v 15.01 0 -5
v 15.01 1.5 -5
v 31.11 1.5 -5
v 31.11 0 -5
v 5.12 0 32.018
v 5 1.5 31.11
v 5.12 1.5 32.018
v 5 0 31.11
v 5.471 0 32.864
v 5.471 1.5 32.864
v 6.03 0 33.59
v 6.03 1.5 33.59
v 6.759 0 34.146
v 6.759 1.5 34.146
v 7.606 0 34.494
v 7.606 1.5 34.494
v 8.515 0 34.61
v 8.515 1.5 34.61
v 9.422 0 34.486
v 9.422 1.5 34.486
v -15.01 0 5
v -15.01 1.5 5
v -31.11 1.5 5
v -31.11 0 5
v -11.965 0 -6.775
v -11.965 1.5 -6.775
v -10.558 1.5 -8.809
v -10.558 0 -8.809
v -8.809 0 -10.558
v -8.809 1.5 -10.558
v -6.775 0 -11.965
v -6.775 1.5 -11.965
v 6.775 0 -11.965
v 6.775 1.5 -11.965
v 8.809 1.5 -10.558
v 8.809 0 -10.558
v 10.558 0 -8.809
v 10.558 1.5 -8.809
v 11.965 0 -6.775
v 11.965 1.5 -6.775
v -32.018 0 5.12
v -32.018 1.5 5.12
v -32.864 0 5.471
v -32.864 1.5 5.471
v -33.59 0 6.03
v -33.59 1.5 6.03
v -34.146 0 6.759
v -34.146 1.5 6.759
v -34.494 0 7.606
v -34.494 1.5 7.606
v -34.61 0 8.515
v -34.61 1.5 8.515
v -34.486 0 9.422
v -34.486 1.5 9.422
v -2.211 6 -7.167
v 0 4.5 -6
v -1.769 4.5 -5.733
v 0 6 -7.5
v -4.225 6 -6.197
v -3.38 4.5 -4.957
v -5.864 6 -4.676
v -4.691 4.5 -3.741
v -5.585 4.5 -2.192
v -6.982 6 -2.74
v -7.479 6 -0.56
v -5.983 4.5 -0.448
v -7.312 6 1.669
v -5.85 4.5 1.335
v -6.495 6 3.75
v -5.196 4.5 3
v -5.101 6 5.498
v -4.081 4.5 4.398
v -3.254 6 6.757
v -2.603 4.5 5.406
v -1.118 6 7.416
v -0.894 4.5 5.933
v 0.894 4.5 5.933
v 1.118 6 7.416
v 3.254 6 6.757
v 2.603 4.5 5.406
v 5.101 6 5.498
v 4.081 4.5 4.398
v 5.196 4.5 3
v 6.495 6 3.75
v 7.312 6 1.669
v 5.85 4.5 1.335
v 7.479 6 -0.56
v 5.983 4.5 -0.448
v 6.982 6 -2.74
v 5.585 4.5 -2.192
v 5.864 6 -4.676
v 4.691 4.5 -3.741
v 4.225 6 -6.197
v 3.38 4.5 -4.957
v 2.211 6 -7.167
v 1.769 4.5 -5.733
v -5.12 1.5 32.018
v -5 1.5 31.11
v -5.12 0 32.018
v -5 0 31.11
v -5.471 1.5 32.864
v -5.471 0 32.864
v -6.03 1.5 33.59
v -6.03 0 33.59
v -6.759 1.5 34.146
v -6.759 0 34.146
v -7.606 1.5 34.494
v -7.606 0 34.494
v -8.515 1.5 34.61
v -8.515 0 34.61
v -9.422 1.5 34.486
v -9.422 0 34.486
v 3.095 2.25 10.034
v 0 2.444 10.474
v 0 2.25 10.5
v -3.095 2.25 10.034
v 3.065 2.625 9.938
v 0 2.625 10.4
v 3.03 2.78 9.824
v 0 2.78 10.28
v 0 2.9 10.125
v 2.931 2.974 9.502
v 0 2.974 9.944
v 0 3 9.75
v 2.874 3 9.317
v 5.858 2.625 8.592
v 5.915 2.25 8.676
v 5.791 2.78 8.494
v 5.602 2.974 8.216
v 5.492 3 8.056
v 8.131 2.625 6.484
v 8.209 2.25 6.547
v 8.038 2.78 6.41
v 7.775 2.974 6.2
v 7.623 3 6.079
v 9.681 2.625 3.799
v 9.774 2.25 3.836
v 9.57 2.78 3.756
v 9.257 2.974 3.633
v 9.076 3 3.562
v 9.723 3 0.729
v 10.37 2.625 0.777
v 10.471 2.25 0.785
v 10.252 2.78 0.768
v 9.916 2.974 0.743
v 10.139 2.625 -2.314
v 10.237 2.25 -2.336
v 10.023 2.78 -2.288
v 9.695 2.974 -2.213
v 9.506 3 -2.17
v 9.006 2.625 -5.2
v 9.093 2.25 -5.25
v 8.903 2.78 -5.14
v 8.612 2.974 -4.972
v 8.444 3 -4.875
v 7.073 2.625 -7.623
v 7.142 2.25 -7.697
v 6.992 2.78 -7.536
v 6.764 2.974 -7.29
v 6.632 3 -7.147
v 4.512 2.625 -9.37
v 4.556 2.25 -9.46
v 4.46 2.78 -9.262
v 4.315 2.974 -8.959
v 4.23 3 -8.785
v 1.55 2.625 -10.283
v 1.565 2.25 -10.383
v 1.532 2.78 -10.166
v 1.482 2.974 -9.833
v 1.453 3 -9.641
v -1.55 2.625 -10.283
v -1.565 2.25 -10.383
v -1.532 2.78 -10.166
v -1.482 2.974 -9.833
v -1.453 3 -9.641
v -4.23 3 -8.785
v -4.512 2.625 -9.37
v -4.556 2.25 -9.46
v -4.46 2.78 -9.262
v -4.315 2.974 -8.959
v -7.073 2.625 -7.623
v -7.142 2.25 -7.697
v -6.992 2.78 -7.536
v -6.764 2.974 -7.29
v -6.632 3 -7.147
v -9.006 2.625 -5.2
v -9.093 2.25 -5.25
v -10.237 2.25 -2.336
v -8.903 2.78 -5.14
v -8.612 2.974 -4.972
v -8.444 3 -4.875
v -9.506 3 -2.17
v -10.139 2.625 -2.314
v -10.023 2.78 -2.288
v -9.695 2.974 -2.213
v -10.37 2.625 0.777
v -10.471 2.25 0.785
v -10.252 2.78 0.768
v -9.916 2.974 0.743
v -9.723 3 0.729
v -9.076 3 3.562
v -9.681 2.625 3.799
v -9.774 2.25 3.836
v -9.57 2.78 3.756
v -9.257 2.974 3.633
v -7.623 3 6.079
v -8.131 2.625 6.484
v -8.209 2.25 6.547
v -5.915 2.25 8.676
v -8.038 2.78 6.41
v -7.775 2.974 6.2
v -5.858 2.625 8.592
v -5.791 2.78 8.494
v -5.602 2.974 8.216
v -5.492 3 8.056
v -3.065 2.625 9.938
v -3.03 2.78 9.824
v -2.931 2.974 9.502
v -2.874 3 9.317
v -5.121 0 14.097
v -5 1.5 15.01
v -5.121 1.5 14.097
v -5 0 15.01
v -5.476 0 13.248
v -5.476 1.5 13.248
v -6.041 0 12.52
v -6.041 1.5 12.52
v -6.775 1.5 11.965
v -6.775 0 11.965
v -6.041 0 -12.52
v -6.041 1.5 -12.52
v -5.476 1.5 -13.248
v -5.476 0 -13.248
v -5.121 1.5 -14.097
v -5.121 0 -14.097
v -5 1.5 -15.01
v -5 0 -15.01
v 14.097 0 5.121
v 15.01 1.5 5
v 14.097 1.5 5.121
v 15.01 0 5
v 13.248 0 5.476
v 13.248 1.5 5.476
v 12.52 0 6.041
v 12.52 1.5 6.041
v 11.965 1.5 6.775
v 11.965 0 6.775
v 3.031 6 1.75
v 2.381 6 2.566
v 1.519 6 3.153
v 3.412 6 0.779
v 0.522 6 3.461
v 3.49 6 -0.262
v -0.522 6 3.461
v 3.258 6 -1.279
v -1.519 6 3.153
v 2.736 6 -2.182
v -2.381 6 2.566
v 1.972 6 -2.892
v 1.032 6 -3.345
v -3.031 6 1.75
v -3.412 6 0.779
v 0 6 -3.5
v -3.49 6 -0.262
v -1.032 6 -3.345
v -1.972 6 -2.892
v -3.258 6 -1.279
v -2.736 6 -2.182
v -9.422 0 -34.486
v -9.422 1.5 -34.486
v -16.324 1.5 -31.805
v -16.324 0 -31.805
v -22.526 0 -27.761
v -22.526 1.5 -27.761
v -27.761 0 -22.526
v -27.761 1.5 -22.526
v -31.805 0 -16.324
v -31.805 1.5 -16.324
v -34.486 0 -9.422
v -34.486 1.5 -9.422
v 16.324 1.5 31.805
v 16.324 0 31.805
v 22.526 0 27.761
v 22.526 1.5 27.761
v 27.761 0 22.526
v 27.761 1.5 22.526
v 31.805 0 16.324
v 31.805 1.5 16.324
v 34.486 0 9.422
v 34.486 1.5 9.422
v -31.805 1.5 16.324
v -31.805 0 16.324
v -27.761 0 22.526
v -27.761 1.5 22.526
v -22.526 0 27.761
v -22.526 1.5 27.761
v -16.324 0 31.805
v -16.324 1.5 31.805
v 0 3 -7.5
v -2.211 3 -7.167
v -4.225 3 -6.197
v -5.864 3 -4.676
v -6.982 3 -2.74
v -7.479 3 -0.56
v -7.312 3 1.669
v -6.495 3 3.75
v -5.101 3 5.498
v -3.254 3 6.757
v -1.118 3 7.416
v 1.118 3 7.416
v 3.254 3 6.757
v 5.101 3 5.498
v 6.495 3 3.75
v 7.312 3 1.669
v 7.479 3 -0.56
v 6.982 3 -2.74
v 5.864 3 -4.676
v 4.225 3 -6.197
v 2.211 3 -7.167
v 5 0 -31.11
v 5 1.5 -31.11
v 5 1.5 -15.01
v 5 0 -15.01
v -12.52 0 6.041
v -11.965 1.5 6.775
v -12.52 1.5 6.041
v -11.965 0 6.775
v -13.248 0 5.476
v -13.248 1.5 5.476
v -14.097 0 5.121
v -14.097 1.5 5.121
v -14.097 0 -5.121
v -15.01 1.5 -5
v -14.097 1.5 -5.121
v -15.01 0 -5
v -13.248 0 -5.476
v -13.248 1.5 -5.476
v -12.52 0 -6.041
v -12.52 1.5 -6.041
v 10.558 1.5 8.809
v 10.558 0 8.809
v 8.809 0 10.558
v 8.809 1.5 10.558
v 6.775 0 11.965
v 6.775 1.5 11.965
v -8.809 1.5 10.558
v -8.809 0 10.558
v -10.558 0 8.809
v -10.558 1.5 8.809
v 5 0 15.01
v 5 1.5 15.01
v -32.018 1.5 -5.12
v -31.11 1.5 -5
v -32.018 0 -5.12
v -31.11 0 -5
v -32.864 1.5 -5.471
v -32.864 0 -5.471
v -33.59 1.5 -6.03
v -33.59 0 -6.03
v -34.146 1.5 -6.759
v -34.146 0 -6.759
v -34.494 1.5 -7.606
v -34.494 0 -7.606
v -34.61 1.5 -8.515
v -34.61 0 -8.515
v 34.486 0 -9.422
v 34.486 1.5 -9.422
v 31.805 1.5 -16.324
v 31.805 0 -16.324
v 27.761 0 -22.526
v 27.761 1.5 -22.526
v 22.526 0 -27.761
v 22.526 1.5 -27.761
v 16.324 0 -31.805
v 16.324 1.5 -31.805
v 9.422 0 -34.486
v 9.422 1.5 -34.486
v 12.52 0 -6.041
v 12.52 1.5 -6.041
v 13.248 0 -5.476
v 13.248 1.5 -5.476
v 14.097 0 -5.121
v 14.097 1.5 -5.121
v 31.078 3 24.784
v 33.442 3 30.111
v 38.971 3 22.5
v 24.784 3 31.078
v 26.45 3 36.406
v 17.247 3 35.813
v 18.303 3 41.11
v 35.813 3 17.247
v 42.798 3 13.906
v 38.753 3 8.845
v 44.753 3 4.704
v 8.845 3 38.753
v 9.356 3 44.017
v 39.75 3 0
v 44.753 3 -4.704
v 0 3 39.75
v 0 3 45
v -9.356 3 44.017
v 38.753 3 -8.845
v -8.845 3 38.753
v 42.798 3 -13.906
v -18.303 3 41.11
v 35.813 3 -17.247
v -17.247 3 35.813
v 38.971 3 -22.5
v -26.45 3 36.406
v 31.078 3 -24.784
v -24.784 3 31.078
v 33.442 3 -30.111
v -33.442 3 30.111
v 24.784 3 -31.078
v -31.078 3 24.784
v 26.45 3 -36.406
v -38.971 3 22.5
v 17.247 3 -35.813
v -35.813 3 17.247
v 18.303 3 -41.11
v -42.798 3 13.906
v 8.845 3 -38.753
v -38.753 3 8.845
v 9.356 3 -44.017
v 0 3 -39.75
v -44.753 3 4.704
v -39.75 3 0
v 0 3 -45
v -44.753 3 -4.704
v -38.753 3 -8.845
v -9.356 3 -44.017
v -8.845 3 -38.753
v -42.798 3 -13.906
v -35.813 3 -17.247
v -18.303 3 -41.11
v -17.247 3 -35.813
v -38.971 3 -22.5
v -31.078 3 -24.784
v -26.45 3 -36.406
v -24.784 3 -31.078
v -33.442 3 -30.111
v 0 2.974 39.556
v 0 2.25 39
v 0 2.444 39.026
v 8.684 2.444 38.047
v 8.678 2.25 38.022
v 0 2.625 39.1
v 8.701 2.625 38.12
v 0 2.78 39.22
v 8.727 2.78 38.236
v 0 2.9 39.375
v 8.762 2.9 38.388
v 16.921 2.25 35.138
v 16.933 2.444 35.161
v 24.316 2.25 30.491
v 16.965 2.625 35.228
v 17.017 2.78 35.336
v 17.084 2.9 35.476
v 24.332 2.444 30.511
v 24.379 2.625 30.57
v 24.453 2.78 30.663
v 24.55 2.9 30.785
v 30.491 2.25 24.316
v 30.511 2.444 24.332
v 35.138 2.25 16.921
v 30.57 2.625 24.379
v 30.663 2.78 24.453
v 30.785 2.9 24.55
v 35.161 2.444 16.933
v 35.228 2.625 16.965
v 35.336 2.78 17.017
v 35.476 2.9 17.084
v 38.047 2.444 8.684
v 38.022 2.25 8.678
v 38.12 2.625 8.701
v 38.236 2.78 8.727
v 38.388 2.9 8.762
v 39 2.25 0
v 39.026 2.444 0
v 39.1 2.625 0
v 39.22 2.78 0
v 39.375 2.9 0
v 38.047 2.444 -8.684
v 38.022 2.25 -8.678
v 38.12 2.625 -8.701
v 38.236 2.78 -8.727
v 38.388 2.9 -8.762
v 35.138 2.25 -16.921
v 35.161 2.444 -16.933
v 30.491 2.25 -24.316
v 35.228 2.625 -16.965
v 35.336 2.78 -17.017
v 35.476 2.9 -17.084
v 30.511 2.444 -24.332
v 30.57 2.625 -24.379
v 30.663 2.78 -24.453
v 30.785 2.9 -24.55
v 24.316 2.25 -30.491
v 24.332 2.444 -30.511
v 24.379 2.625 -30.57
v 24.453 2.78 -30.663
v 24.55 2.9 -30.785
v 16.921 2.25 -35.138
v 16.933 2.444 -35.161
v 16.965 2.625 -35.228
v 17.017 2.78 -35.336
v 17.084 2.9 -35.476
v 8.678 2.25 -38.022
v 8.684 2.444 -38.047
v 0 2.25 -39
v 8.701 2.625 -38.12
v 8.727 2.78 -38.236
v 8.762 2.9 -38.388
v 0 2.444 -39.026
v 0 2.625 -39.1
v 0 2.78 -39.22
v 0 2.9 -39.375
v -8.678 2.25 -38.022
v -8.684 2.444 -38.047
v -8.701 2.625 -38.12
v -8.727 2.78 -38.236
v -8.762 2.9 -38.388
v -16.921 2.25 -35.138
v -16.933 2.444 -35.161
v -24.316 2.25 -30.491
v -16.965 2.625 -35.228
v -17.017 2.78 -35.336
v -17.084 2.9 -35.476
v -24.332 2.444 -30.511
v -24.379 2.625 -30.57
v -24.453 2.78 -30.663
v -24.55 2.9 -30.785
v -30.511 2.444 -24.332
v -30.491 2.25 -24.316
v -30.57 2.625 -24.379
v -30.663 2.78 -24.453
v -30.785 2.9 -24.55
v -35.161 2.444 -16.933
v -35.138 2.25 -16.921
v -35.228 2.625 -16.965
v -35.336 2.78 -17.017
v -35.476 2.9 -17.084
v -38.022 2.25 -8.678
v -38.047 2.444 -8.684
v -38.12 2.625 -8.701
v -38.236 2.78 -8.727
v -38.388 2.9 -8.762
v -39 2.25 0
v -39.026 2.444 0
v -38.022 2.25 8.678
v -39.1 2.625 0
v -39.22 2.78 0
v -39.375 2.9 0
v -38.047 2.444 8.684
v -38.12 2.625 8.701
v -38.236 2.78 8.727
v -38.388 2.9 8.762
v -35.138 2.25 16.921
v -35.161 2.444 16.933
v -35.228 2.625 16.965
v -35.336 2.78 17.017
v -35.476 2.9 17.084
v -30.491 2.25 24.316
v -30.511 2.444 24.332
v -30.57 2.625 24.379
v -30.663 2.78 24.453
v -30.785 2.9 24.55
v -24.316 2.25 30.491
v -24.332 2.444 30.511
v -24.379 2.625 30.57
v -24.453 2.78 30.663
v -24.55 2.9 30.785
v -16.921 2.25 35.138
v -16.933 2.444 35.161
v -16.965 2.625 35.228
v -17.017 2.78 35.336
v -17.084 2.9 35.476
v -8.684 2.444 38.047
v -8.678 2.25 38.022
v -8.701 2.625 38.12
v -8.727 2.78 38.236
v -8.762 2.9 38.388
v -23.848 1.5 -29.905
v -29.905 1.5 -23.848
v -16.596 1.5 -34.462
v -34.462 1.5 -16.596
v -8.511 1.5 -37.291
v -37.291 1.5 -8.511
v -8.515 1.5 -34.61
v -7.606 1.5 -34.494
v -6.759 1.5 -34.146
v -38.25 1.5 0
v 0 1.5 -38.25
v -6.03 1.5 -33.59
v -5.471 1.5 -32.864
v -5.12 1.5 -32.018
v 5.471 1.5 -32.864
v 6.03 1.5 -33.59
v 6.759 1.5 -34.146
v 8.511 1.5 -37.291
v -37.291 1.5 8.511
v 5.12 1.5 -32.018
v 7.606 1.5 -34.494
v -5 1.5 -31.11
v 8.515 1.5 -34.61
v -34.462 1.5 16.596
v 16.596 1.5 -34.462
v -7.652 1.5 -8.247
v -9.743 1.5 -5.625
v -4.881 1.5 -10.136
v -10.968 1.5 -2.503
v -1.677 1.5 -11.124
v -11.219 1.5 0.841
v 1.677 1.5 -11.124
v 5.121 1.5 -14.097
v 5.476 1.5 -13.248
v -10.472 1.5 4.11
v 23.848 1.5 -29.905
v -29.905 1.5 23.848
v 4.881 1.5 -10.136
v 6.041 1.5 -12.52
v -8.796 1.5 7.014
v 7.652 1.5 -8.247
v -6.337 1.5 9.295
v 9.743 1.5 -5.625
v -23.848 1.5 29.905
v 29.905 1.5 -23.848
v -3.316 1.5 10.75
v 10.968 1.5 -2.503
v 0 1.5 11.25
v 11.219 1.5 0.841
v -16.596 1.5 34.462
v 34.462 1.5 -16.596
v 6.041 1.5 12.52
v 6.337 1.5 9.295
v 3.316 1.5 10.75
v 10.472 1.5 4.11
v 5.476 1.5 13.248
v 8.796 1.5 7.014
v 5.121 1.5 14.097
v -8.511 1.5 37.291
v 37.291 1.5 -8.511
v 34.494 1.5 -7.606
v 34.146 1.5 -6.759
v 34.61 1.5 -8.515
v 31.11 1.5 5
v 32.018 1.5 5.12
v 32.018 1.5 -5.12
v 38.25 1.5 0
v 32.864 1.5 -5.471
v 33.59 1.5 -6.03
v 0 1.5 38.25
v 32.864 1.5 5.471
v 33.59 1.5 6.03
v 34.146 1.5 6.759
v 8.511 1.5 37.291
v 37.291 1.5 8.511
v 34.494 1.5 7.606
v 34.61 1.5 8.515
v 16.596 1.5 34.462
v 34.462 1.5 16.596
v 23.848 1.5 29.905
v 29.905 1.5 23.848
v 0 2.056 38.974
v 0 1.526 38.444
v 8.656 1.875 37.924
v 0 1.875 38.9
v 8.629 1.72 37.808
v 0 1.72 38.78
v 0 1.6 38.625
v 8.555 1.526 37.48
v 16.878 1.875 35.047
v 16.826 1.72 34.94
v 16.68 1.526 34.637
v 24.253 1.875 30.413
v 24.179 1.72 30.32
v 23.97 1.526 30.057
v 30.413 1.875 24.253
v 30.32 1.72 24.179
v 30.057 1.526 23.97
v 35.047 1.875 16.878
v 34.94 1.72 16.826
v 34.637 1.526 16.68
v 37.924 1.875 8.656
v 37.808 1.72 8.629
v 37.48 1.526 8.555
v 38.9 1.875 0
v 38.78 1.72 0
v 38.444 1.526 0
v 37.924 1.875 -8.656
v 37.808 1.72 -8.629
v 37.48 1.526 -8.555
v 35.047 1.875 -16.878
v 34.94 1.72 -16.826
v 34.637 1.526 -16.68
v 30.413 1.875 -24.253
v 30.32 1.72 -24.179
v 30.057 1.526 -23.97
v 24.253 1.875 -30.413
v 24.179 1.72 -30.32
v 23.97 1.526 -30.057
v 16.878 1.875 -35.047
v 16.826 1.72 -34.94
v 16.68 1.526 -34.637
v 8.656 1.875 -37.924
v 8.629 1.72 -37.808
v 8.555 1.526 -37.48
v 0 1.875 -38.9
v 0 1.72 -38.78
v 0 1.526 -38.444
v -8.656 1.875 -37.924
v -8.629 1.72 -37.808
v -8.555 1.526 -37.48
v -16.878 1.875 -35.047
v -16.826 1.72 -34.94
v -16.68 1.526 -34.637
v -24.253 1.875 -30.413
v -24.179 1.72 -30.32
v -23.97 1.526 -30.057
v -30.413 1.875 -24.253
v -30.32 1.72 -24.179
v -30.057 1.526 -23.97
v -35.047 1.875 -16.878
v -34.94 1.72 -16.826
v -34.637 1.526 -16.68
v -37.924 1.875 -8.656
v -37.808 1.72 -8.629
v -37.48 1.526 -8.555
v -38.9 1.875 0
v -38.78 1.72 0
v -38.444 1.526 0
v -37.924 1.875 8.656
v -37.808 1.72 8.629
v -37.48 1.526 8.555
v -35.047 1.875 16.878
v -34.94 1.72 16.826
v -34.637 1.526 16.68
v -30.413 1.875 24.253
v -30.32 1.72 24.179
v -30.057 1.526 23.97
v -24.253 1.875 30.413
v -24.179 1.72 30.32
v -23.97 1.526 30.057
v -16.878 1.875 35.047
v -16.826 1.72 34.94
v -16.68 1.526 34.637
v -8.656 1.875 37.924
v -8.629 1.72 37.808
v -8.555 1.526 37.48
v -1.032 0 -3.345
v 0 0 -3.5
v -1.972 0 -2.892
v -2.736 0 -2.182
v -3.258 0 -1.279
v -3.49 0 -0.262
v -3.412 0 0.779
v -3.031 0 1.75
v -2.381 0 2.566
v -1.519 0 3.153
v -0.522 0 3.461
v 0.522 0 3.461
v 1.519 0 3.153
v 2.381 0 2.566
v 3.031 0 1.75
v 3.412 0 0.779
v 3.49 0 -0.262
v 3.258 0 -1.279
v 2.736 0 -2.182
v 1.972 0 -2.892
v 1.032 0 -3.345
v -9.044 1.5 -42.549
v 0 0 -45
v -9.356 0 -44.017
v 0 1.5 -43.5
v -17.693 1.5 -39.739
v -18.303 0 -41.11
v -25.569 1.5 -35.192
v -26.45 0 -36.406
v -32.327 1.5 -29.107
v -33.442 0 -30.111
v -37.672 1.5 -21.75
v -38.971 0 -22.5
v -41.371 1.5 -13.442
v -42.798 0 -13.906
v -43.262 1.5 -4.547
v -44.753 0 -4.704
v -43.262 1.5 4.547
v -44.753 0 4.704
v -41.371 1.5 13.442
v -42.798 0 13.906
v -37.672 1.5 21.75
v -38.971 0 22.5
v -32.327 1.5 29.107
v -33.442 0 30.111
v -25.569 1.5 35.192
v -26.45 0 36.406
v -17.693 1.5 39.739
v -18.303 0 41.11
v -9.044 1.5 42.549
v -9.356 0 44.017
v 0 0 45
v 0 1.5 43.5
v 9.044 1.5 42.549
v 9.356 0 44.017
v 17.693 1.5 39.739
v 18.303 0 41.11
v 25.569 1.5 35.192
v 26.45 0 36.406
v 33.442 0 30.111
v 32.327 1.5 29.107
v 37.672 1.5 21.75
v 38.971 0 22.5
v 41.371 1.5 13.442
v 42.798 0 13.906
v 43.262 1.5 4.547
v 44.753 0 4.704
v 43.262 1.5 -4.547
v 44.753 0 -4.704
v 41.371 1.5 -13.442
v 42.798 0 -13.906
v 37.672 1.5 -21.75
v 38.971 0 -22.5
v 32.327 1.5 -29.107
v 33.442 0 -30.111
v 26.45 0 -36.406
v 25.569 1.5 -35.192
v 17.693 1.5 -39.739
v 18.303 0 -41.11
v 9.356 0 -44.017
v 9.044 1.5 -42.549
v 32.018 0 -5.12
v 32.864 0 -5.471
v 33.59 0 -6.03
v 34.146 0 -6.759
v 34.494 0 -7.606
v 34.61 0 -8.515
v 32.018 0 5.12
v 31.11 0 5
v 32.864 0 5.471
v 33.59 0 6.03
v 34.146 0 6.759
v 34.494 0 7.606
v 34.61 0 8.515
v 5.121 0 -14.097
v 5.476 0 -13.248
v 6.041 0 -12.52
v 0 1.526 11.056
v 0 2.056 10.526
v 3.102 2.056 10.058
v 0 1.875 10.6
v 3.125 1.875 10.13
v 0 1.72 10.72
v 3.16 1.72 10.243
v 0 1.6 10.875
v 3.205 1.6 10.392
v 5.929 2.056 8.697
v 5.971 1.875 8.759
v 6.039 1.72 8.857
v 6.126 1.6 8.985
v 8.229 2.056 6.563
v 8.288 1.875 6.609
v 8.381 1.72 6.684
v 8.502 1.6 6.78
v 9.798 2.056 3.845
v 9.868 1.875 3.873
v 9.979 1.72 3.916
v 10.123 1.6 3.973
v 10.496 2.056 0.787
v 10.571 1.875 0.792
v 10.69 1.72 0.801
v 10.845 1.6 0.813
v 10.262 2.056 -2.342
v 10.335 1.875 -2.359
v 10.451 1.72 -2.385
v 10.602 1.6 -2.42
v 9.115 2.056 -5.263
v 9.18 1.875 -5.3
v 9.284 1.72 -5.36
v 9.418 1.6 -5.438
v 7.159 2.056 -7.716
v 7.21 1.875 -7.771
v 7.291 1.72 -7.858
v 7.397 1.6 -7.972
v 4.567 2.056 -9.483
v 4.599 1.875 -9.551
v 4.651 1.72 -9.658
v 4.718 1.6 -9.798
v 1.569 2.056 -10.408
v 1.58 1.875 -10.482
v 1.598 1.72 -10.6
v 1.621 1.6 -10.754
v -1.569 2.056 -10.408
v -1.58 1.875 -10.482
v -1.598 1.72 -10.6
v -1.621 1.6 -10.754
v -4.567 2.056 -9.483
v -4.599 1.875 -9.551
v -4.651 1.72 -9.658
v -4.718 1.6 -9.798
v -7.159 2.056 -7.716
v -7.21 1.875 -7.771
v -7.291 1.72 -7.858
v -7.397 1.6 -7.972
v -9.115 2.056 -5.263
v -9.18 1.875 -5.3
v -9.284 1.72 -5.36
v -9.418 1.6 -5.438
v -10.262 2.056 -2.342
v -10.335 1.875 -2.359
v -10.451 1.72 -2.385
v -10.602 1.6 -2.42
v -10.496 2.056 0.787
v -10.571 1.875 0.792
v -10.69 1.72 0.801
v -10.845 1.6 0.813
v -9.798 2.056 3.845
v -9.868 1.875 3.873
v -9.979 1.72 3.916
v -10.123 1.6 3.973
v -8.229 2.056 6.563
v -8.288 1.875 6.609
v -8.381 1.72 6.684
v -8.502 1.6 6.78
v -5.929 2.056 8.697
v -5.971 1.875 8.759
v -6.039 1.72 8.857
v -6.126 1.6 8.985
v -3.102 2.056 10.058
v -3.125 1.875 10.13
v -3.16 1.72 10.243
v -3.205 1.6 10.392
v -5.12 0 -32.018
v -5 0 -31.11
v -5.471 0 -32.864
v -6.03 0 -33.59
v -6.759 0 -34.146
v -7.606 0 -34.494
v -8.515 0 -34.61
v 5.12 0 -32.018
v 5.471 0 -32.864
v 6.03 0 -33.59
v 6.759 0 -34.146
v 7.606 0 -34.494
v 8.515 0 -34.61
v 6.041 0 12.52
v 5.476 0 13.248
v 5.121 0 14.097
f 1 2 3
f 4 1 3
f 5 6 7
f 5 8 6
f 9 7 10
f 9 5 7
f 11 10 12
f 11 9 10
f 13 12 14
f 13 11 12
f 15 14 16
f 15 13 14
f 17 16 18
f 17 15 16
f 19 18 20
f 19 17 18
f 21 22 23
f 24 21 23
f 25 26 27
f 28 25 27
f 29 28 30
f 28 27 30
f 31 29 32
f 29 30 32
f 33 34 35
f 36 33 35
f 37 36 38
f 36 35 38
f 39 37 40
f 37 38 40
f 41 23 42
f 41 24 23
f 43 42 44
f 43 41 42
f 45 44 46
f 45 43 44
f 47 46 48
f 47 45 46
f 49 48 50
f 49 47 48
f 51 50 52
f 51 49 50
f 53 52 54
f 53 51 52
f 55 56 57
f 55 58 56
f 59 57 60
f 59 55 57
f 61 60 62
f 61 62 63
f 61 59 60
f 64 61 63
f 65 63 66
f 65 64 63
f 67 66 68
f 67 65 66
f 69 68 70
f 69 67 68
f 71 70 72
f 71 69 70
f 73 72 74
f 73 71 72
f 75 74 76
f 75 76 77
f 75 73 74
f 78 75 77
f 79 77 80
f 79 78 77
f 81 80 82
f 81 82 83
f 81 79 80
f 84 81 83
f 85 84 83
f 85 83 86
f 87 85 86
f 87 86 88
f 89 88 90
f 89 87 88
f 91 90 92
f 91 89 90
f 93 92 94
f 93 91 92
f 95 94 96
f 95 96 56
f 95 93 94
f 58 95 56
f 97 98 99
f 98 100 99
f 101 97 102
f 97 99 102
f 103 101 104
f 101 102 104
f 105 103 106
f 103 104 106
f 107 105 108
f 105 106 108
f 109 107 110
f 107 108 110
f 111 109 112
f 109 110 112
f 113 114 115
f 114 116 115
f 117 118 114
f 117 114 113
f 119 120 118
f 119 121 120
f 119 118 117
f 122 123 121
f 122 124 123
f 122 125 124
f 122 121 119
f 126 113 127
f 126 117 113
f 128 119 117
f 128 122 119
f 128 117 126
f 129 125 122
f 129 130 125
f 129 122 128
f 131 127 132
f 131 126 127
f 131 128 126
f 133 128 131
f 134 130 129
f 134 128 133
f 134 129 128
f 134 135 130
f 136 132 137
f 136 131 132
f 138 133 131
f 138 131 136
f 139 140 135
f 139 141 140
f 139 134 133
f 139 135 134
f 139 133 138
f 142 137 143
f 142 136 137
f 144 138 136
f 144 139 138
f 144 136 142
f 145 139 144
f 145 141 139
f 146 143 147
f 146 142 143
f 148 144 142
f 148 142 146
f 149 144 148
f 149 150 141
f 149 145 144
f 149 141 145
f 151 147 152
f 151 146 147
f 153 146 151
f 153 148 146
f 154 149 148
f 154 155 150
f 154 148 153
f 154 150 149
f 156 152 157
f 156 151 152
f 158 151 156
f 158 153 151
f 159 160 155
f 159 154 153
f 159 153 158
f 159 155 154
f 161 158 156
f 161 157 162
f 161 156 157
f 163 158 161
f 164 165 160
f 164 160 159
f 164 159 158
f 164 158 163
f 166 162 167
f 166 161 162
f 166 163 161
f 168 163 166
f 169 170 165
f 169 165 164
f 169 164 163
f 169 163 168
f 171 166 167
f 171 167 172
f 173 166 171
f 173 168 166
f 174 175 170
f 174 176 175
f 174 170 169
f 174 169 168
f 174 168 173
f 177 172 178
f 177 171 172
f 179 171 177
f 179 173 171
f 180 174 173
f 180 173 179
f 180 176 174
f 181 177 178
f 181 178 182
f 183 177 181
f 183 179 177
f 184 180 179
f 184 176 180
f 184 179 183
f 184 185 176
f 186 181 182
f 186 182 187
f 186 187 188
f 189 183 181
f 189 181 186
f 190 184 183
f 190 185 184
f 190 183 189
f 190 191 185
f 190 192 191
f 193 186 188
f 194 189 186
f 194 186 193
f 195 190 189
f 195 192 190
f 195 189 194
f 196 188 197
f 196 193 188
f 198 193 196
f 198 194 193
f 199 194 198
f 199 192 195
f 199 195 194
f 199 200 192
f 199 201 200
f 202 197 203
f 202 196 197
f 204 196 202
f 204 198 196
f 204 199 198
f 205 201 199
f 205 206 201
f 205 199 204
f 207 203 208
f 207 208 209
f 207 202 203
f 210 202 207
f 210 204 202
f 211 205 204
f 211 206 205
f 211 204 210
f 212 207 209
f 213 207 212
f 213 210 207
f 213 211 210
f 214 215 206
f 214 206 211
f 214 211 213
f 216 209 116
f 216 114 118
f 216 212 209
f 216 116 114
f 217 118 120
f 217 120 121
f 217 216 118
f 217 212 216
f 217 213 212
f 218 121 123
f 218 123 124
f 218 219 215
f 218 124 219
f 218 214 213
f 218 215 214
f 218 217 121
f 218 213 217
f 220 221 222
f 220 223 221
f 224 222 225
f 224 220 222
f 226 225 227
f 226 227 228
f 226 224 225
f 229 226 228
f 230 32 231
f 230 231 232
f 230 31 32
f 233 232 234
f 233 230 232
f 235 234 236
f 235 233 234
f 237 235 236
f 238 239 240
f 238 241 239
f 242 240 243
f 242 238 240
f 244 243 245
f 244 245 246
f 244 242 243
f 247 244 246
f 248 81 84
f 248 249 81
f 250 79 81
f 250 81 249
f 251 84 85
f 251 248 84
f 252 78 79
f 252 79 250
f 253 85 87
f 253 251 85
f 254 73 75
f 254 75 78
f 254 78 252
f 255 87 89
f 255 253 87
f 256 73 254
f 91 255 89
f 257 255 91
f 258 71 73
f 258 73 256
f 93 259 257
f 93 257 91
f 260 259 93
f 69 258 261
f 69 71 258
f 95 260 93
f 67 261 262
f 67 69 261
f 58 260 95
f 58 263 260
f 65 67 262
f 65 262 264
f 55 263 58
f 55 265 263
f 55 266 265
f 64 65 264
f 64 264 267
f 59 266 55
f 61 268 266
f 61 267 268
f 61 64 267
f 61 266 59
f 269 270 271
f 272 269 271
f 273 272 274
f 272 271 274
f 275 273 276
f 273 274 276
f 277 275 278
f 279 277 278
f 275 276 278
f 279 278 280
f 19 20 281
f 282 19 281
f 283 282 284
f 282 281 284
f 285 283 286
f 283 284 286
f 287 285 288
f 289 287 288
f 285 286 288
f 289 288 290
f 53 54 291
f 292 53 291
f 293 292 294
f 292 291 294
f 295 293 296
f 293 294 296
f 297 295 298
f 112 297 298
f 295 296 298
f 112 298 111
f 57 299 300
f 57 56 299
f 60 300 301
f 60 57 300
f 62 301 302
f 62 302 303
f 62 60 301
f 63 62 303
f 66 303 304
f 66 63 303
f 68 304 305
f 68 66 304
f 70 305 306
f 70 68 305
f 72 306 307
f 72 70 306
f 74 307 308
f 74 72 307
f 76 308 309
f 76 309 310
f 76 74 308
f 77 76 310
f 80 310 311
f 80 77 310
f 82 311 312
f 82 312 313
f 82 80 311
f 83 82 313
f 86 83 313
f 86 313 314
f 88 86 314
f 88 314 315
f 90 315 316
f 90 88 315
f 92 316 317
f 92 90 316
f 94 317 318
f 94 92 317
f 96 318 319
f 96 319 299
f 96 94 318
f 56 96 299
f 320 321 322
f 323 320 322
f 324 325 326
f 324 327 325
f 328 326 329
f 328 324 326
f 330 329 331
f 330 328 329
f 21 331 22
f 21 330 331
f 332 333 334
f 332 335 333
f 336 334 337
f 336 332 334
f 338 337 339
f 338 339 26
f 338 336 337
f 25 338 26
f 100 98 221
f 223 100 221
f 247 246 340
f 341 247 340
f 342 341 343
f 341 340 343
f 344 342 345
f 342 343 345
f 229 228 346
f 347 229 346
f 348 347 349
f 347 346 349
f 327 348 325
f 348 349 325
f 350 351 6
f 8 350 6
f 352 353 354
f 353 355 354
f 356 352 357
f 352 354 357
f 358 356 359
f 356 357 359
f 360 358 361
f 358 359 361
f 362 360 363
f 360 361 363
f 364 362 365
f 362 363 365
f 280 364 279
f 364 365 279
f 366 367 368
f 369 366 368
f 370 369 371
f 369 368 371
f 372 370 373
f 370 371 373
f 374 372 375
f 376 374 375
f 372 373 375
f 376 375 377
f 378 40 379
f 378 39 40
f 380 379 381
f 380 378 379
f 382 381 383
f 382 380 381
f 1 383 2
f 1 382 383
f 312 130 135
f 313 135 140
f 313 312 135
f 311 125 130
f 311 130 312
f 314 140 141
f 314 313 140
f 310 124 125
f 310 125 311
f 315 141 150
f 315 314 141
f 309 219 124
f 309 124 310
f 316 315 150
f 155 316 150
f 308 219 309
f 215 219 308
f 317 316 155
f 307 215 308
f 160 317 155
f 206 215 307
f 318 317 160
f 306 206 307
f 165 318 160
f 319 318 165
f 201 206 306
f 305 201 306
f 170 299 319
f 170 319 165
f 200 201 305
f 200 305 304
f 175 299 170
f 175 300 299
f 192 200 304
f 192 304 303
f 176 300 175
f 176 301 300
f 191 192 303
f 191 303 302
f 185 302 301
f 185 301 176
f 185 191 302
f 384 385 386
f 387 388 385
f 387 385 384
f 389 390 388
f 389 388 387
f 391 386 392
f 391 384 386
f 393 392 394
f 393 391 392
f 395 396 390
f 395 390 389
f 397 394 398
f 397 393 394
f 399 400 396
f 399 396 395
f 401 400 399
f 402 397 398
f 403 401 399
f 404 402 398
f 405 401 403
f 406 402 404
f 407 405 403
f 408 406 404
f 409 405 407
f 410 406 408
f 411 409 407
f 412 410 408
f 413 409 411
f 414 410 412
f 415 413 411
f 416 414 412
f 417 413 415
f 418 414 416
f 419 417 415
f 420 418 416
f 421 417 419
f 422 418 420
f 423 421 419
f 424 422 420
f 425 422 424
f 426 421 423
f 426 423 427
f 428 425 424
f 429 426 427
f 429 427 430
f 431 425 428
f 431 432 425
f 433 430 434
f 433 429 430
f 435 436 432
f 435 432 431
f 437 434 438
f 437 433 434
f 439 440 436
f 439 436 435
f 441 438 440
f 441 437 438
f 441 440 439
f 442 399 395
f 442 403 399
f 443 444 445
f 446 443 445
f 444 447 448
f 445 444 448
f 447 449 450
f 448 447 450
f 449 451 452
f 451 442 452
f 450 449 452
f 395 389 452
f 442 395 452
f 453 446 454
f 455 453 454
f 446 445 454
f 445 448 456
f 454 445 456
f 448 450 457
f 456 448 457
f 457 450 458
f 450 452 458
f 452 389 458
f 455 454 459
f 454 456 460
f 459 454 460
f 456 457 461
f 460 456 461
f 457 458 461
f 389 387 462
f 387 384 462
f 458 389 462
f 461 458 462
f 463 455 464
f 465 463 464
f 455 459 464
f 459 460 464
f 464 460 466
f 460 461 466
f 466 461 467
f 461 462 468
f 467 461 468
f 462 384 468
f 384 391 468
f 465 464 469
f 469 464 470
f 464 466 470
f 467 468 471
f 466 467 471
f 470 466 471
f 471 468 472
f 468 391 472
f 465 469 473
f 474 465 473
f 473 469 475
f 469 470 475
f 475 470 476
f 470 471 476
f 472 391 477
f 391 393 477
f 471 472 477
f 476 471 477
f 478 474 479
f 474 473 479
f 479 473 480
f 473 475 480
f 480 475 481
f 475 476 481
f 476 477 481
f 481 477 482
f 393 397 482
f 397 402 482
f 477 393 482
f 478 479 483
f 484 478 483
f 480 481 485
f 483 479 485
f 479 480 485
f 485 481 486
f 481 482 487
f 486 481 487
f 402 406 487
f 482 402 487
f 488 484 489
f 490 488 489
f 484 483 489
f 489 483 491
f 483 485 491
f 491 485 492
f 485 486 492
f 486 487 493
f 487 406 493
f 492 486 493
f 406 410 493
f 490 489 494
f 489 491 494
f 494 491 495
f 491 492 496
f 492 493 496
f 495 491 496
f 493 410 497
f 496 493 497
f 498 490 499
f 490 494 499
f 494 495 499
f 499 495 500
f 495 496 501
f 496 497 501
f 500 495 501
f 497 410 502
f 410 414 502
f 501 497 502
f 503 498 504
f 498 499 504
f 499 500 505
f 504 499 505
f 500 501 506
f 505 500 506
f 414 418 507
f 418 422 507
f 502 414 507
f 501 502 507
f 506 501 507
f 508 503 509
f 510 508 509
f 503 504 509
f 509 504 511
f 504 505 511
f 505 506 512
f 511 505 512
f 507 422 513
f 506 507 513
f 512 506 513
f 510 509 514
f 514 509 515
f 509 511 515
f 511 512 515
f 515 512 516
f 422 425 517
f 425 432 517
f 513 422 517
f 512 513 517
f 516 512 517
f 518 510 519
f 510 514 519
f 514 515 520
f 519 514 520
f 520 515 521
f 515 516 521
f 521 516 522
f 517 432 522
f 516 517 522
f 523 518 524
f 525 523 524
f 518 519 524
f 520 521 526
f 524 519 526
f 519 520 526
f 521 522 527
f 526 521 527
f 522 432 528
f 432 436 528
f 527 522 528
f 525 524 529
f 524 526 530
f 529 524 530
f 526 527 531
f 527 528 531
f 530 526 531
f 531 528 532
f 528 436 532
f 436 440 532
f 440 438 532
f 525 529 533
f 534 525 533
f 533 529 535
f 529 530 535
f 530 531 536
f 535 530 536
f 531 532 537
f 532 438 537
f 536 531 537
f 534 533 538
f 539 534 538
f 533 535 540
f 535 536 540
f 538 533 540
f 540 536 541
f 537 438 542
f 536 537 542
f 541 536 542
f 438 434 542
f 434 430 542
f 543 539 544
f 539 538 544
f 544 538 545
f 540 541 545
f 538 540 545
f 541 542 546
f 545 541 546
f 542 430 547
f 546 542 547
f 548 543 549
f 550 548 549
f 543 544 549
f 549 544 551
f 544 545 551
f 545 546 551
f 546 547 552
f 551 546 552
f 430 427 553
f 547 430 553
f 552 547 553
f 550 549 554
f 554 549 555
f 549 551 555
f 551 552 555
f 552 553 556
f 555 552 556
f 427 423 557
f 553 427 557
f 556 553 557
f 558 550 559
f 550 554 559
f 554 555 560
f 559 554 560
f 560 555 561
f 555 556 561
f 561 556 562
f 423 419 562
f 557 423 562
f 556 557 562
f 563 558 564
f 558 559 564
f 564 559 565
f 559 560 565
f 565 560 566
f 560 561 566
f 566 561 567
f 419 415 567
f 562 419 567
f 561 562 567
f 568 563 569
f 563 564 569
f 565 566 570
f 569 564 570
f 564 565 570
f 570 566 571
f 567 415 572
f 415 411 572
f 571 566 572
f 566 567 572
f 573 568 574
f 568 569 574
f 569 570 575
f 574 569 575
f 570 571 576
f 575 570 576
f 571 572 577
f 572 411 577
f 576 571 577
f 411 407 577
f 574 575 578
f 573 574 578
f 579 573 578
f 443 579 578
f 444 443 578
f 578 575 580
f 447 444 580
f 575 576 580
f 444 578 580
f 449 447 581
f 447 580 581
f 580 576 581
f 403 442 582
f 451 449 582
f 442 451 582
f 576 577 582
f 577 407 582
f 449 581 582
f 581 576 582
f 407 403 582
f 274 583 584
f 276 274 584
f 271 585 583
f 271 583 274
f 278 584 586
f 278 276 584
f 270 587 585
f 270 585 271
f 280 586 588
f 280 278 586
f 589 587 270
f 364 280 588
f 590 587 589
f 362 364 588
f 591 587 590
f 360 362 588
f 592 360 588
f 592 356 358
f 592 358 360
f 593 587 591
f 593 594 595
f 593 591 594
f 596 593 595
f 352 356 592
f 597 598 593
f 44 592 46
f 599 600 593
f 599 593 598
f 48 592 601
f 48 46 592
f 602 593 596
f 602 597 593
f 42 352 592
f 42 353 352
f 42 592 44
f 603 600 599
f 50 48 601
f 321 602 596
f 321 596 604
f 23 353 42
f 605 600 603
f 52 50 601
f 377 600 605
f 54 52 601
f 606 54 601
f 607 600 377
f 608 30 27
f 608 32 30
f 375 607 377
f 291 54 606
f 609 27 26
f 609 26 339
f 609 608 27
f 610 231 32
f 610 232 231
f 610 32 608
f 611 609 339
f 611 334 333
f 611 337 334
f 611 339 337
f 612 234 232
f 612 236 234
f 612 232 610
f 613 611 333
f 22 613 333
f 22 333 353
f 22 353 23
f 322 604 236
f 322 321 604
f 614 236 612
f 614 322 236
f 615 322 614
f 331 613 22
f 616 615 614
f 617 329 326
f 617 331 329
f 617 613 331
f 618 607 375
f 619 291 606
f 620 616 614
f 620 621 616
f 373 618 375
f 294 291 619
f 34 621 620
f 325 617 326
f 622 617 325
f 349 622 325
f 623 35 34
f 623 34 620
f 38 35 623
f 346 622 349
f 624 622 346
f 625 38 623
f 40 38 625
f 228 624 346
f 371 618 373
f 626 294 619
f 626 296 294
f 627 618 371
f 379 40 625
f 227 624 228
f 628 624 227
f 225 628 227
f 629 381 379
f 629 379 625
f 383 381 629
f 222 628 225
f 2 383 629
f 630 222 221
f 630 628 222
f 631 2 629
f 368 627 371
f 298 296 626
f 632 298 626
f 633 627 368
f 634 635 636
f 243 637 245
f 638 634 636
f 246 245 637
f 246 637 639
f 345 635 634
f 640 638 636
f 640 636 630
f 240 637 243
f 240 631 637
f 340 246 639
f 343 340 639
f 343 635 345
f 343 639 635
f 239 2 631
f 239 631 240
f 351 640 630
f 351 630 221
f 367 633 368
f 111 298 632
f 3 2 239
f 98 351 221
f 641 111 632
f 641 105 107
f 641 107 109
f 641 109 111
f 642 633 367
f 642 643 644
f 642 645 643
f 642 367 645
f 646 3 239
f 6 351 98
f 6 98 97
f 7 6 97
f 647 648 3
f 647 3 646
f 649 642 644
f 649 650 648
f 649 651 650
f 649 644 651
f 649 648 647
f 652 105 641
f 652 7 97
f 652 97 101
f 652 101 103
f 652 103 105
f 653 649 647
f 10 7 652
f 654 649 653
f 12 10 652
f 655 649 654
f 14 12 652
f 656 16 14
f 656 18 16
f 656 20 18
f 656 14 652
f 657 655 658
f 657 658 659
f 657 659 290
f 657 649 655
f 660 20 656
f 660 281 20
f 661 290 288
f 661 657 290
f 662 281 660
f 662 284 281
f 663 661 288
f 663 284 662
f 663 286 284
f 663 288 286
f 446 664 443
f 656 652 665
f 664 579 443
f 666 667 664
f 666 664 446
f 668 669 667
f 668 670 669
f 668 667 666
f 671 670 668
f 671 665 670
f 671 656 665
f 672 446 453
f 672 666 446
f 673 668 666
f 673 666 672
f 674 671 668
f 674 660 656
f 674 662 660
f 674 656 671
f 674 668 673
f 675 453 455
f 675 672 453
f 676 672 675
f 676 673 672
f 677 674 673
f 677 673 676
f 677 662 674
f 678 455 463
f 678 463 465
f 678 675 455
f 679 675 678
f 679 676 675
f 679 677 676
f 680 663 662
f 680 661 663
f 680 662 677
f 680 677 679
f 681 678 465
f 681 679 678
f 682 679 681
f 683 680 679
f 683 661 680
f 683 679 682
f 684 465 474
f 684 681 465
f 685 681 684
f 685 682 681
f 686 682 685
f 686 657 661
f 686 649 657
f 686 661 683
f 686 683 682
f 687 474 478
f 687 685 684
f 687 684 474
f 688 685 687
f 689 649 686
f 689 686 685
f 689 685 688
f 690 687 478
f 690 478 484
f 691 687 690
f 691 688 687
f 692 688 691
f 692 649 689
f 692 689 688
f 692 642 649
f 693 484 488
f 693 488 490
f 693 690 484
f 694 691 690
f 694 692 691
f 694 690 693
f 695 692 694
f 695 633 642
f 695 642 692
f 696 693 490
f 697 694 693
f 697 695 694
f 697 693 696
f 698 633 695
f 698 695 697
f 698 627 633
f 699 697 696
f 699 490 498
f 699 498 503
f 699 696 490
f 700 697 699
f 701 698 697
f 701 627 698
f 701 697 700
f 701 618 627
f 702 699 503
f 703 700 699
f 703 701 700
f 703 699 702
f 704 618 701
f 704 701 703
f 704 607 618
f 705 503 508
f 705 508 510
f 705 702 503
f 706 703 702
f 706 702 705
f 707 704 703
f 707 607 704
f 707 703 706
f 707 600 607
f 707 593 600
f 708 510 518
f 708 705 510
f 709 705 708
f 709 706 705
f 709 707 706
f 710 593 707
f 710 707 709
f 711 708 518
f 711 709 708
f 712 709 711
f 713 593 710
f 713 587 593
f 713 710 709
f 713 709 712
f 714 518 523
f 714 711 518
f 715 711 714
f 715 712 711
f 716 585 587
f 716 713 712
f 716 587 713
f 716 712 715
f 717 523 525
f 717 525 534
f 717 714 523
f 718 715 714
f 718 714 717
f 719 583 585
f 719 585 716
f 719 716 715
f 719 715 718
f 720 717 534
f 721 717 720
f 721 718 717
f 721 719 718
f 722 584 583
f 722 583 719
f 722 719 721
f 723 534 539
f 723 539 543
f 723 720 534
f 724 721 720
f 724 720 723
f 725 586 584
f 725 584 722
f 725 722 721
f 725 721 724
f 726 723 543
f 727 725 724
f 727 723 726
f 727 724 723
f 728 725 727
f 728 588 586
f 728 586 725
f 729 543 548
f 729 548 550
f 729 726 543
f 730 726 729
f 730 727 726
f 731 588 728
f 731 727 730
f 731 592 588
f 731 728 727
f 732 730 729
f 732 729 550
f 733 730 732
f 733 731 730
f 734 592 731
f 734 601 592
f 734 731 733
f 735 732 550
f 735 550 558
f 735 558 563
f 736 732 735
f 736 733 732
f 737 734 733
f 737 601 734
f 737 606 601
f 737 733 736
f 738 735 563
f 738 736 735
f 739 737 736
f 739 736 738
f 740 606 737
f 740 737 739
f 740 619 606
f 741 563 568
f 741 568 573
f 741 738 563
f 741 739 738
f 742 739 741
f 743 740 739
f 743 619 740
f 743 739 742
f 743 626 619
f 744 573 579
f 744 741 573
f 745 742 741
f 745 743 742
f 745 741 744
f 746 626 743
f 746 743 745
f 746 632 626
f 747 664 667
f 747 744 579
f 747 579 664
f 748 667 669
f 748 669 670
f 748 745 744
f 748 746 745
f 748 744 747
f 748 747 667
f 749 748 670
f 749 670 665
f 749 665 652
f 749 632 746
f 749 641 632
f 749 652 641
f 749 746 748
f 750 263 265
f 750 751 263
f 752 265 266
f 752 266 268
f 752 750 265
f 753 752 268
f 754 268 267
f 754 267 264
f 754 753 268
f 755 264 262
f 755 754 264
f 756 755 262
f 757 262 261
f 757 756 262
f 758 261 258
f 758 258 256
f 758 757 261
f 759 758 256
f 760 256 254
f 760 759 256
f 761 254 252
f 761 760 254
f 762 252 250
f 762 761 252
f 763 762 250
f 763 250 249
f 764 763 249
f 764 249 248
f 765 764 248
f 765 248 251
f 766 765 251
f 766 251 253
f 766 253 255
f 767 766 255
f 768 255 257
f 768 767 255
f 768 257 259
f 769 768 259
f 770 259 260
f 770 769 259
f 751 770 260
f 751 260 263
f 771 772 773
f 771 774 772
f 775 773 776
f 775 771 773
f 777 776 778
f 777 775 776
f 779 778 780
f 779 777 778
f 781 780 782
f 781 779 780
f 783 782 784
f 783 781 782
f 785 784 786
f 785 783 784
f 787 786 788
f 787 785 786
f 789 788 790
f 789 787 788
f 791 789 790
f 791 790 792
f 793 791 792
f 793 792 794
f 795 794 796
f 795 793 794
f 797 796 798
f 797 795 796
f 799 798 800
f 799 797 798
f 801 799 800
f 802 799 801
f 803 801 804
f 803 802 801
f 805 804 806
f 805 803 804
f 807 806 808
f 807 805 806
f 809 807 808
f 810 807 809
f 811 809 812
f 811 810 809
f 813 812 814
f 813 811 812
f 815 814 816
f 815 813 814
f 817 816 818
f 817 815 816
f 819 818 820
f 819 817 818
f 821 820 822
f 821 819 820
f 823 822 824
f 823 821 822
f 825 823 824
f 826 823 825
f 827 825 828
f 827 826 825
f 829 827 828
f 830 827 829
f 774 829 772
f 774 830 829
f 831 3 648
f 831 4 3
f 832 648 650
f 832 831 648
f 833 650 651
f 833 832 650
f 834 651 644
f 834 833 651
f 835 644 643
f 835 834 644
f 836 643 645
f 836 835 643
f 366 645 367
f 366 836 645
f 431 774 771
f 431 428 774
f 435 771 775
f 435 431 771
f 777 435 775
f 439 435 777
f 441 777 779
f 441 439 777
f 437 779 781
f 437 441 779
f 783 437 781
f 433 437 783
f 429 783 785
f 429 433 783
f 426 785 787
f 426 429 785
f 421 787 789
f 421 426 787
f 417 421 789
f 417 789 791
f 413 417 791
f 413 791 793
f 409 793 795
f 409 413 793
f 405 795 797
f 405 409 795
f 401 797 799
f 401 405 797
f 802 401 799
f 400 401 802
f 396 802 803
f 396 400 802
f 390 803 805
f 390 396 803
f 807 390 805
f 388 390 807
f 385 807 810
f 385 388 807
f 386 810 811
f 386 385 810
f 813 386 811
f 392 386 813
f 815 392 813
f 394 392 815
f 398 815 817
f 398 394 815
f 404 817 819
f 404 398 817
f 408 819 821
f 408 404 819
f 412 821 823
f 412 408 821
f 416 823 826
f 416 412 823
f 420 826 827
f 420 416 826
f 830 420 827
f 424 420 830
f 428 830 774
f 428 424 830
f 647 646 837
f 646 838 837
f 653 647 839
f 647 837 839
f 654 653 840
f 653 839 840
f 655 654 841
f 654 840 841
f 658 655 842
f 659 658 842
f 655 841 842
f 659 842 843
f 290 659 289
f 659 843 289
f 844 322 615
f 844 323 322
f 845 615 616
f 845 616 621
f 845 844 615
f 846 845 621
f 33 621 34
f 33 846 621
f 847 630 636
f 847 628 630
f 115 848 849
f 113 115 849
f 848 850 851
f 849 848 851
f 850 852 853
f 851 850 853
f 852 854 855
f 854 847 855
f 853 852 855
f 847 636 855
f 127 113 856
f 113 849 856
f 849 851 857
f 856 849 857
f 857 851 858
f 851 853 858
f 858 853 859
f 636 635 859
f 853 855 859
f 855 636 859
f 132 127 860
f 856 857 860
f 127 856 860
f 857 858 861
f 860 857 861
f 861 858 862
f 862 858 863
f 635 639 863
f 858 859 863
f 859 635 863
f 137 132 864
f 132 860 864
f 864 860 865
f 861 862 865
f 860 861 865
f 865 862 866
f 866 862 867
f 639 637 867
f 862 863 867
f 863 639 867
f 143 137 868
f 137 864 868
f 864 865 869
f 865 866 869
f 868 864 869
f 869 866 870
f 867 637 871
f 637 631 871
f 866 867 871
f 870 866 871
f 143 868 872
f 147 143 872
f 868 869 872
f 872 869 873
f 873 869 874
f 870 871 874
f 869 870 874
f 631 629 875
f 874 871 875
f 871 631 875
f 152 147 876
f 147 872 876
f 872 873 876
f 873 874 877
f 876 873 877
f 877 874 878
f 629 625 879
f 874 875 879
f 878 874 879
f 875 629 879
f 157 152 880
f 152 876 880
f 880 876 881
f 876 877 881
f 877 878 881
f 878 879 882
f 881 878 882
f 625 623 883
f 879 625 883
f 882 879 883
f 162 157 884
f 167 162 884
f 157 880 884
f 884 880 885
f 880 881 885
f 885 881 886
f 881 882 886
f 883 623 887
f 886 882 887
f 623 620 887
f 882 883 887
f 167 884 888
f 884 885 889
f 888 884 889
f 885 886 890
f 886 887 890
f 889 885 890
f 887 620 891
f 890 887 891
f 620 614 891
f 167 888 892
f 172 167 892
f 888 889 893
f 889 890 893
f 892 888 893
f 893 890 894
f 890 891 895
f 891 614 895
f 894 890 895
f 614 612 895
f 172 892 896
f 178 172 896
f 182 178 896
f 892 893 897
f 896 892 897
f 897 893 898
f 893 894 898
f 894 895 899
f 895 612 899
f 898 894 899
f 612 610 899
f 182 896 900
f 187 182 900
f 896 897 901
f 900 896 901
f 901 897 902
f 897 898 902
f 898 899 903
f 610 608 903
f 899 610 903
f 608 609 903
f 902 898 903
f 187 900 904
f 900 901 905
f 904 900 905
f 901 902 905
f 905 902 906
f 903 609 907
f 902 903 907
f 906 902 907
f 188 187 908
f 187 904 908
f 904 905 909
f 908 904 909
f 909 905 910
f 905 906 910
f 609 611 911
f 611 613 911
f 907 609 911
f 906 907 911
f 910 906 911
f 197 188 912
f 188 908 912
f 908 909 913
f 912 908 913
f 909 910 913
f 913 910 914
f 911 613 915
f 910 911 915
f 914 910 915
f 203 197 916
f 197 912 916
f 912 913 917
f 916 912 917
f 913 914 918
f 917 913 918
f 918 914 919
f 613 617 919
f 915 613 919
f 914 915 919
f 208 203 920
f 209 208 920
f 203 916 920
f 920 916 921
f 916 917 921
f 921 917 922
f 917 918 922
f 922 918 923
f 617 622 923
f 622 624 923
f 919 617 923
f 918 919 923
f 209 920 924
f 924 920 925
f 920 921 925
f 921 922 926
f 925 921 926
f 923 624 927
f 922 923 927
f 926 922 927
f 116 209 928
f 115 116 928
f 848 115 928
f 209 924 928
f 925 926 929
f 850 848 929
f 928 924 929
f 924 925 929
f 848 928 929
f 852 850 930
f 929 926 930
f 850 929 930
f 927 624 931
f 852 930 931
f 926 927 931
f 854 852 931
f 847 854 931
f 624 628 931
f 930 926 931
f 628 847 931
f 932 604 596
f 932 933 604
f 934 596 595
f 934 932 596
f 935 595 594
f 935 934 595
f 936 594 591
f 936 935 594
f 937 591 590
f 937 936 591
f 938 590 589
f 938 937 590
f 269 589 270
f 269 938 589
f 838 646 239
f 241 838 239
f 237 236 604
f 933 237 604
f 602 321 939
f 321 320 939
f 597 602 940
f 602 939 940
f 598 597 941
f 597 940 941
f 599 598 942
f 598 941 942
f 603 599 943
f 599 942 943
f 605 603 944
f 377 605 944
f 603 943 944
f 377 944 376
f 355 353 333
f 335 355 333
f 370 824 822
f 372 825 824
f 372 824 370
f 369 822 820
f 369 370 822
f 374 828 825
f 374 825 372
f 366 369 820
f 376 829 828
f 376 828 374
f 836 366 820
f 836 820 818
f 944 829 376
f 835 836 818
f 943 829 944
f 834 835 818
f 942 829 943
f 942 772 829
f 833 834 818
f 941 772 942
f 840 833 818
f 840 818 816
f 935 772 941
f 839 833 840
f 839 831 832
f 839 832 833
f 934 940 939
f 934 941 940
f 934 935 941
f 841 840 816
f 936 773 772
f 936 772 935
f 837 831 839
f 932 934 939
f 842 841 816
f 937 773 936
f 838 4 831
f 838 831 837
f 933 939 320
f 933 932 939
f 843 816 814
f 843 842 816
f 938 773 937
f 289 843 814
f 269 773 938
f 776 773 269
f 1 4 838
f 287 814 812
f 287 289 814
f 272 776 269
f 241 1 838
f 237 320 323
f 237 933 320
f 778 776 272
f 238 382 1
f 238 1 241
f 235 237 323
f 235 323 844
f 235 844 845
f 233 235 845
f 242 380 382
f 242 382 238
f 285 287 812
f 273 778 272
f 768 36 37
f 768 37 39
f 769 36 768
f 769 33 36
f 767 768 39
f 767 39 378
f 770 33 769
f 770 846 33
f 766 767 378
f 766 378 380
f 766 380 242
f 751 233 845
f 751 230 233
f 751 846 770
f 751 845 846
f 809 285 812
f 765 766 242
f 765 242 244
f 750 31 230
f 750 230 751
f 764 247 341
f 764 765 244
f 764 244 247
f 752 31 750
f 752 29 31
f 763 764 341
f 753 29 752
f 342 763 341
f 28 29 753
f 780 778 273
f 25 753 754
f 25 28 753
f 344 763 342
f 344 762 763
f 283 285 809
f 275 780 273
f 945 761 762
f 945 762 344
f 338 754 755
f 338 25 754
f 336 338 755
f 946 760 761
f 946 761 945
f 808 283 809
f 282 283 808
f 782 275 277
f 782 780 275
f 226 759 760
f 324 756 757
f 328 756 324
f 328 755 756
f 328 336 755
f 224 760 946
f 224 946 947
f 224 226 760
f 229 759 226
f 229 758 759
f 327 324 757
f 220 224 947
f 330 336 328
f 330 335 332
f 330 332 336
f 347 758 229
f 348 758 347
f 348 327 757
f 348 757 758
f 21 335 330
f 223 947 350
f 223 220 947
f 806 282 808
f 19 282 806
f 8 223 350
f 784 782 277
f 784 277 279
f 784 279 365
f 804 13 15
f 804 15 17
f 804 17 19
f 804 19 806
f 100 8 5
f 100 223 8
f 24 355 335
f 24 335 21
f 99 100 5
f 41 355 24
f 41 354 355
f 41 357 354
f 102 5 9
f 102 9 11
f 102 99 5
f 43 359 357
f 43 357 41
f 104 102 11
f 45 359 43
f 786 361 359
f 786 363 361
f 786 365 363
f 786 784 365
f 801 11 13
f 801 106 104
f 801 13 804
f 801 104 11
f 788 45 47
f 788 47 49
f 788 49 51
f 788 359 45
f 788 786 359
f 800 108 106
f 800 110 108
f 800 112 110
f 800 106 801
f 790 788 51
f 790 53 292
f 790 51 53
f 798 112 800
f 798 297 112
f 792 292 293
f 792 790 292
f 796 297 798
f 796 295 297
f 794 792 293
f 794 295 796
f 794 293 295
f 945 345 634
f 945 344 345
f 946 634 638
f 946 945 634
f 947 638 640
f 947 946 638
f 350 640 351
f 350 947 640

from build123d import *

# Parameters (mm, degrees)
SKETCH2_R          = 39
SKETCH2_R_2        = 10.5
CUT_EXTRUDE1_DEPTH = 1.5
FILLET1_R          = 0.75
CUT_EXTRUDE2_DEPTH = 1.5
FILLET2_R          = 3.5


with BuildPart() as part:
    # Sketch1 → Revolve1 (revolve)
    with BuildSketch(Plane.XY, mode=Mode.PRIVATE) as revolve1_sk:
        Polygon((-3.5, 6), (-3.5, 0), (-45, 0), (-43.5, 1.5), (-45, 3), (-7.5, 3), (-6, 4.5), (-7.5, 6), align=None)
    revolve(revolve1_sk.sketch.rotate(Axis((0, 0, 0), (0, 1, 0)), 270), axis=Axis((0, 0, 0), (0, 1, 0)))

    # Sketch2 → Cut-Extrude1 (cut)
    with BuildSketch(Plane(origin=(0, 3, 0), x_dir=(1, 0, 0), z_dir=(0, 1, 0))):
        with Locations(Location((0, 0, 0), (0, 0, 270))):
            Circle(SKETCH2_R)
        with Locations(Location((0, 0, 0), (0, 0, 270))):
            Circle(SKETCH2_R_2, mode=Mode.SUBTRACT)
    extrude(amount=-CUT_EXTRUDE1_DEPTH, mode=Mode.SUBTRACT)

    # Fillet1
    fillet1_edges = [part.edges().sort_by_distance(p)[0] for p in [
        (0, 1.5, -10.5),
        (0, 1.5, -39),
    ]]
    fillet(fillet1_edges, radius=FILLET1_R)
    fillet1_2_edges = [part.edges().sort_by_distance(p)[0] for p in [
        (0, 3, -39),
        (0, 3, -10.5),
    ]]
    fillet(fillet1_2_edges, radius=FILLET1_R - 0.0001)  # a hair under: the kernel refuses the full size

    # Sketch3 → Cut-Extrude2 (cut)
    with BuildSketch(Plane(origin=(0, 1.5, 0), x_dir=(1, 0, 0), z_dir=(0, 1, 0))):
        with BuildLine():
            Line((35.398622855, -5), (12.808688457, -5))
            ThreePointArc((12.808688457, -5), (9.722718241, -9.722718241), (5, -12.808688457))
            Line((5, -12.808688457), (5, -35.398622855))
            ThreePointArc((5, -35.398622855), (25.279067427, -25.279067427), (35.398622855, -5))
        make_face()
        with BuildLine():
            Line((-5, -35.398622855), (-5, -12.808688457))
            ThreePointArc((-5, -12.808688457), (-9.722718241, -9.722718241), (-12.808688457, -5))
            Line((-12.808688457, -5), (-35.398622855, -5))
            ThreePointArc((-35.398622855, -5), (-25.279067427, -25.279067427), (-5, -35.398622855))
        make_face()
        with BuildLine():
            Line((-35.398622855, 5), (-12.808688457, 5))
            ThreePointArc((-12.808688457, 5), (-9.722718241, 9.722718241), (-5, 12.808688457))
            Line((-5, 12.808688457), (-5, 35.398622855))
            ThreePointArc((-5, 35.398622855), (-25.279067427, 25.279067427), (-35.398622855, 5))
        make_face()
        with BuildLine():
            Line((5, 35.398622855), (5, 12.808688457))
            ThreePointArc((5, 12.808688457), (9.722718241, 9.722718241), (12.808688457, 5))
            Line((12.808688457, 5), (35.398622855, 5))
            ThreePointArc((35.398622855, 5), (25.279067427, 25.279067427), (5, 35.398622855))
        make_face()
    extrude(amount=-CUT_EXTRUDE2_DEPTH, mode=Mode.SUBTRACT)

    # Fillet2
    fillet2_edges = [part.edges().sort_by_distance(p)[0] for p in [
        (5, 0.75, -35.398622855),
        (35.398622855, 0.75, -5),
        (12.808688457, 0.75, -5),
        (5, 0.75, -12.808688457),
        (-5, 0.75, -12.808688457),
        (-12.808688457, 0.75, -5),
        (-35.398622855, 0.75, -5),
        (-5, 0.75, -35.398622855),
        (-12.808688457, 0.75, 5),
        (-5, 0.75, 12.808688457),
        (-5, 0.75, 35.398622855),
        (-35.398622855, 0.75, 5),
        (35.398622855, 0.75, 5),
        (5, 0.75, 35.398622855),
        (5, 0.75, 12.808688457),
        (12.808688457, 0.75, 5),
    ]]
    fillet(fillet2_edges, radius=FILLET2_R)


solid = part.part
